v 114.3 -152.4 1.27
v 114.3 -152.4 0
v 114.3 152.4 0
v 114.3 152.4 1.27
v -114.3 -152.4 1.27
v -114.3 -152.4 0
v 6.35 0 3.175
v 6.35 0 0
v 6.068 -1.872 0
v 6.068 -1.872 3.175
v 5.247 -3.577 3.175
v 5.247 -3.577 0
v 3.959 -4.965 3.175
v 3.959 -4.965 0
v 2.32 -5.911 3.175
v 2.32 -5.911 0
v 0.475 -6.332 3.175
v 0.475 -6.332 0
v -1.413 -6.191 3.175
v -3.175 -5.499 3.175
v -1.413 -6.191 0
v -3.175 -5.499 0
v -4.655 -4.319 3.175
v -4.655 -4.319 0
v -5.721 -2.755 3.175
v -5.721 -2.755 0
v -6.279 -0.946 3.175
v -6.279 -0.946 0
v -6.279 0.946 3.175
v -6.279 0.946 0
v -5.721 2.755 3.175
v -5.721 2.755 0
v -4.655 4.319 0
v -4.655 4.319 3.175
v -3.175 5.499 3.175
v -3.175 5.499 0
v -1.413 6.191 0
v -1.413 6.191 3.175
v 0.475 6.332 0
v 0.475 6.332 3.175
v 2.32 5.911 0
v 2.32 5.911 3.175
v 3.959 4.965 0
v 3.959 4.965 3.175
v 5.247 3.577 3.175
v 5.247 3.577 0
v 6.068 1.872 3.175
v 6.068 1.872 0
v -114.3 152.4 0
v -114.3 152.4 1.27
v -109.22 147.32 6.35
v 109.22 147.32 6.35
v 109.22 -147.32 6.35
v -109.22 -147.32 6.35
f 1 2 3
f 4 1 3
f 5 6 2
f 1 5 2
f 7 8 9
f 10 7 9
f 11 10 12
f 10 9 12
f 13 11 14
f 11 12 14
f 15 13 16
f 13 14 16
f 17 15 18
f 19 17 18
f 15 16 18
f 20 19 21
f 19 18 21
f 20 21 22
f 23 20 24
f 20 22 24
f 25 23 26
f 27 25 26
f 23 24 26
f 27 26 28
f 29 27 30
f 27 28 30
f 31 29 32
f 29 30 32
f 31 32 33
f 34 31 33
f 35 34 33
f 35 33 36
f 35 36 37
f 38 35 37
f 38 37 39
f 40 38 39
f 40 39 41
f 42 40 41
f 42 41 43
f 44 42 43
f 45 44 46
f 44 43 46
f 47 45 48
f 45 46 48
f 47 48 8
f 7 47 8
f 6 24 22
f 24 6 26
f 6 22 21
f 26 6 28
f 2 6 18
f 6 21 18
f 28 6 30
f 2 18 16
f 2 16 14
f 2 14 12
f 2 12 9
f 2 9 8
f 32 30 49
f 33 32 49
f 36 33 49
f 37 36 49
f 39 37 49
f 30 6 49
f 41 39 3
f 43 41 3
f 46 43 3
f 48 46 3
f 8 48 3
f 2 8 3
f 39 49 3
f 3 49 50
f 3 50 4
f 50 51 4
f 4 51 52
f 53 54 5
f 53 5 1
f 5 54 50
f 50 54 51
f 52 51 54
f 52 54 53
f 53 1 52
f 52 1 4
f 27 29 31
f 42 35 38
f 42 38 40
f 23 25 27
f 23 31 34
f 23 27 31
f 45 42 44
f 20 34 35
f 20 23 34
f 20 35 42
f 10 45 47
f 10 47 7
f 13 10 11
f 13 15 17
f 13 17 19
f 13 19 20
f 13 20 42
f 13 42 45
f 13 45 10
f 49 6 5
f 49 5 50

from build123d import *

# Parameters (mm, degrees)
F0_W     = 228.6
F0_H     = 304.8
F1_DEPTH = 6.35
F2_R     = 6.35
F3_DEPTH = 3.175
F4_SIZE  = 5.08


with BuildPart() as f1:
    # F0 (on Top) → F1 (new body)
    with BuildSketch(Plane.XY):
        Rectangle(F0_W, F0_H)
    extrude(amount=F1_DEPTH)

    # F2 (on face) → F3 (cut)
    with BuildSketch(Plane(origin=(0, 0, 0), x_dir=(1, 0, 0), z_dir=(0, 0, -1))):
        Circle(F2_R)
    extrude(amount=-F3_DEPTH, mode=Mode.SUBTRACT)

    # F4
    f4_edges = [f1.edges().sort_by_distance(p)[0] for p in [
        (-114.3, 0, 6.35),
        (0, 152.4, 6.35),
        (114.3, 0, 6.35),
        (0, -152.4, 6.35),
    ]]
    chamfer(f4_edges, length=F4_SIZE)


solid = f1.part
